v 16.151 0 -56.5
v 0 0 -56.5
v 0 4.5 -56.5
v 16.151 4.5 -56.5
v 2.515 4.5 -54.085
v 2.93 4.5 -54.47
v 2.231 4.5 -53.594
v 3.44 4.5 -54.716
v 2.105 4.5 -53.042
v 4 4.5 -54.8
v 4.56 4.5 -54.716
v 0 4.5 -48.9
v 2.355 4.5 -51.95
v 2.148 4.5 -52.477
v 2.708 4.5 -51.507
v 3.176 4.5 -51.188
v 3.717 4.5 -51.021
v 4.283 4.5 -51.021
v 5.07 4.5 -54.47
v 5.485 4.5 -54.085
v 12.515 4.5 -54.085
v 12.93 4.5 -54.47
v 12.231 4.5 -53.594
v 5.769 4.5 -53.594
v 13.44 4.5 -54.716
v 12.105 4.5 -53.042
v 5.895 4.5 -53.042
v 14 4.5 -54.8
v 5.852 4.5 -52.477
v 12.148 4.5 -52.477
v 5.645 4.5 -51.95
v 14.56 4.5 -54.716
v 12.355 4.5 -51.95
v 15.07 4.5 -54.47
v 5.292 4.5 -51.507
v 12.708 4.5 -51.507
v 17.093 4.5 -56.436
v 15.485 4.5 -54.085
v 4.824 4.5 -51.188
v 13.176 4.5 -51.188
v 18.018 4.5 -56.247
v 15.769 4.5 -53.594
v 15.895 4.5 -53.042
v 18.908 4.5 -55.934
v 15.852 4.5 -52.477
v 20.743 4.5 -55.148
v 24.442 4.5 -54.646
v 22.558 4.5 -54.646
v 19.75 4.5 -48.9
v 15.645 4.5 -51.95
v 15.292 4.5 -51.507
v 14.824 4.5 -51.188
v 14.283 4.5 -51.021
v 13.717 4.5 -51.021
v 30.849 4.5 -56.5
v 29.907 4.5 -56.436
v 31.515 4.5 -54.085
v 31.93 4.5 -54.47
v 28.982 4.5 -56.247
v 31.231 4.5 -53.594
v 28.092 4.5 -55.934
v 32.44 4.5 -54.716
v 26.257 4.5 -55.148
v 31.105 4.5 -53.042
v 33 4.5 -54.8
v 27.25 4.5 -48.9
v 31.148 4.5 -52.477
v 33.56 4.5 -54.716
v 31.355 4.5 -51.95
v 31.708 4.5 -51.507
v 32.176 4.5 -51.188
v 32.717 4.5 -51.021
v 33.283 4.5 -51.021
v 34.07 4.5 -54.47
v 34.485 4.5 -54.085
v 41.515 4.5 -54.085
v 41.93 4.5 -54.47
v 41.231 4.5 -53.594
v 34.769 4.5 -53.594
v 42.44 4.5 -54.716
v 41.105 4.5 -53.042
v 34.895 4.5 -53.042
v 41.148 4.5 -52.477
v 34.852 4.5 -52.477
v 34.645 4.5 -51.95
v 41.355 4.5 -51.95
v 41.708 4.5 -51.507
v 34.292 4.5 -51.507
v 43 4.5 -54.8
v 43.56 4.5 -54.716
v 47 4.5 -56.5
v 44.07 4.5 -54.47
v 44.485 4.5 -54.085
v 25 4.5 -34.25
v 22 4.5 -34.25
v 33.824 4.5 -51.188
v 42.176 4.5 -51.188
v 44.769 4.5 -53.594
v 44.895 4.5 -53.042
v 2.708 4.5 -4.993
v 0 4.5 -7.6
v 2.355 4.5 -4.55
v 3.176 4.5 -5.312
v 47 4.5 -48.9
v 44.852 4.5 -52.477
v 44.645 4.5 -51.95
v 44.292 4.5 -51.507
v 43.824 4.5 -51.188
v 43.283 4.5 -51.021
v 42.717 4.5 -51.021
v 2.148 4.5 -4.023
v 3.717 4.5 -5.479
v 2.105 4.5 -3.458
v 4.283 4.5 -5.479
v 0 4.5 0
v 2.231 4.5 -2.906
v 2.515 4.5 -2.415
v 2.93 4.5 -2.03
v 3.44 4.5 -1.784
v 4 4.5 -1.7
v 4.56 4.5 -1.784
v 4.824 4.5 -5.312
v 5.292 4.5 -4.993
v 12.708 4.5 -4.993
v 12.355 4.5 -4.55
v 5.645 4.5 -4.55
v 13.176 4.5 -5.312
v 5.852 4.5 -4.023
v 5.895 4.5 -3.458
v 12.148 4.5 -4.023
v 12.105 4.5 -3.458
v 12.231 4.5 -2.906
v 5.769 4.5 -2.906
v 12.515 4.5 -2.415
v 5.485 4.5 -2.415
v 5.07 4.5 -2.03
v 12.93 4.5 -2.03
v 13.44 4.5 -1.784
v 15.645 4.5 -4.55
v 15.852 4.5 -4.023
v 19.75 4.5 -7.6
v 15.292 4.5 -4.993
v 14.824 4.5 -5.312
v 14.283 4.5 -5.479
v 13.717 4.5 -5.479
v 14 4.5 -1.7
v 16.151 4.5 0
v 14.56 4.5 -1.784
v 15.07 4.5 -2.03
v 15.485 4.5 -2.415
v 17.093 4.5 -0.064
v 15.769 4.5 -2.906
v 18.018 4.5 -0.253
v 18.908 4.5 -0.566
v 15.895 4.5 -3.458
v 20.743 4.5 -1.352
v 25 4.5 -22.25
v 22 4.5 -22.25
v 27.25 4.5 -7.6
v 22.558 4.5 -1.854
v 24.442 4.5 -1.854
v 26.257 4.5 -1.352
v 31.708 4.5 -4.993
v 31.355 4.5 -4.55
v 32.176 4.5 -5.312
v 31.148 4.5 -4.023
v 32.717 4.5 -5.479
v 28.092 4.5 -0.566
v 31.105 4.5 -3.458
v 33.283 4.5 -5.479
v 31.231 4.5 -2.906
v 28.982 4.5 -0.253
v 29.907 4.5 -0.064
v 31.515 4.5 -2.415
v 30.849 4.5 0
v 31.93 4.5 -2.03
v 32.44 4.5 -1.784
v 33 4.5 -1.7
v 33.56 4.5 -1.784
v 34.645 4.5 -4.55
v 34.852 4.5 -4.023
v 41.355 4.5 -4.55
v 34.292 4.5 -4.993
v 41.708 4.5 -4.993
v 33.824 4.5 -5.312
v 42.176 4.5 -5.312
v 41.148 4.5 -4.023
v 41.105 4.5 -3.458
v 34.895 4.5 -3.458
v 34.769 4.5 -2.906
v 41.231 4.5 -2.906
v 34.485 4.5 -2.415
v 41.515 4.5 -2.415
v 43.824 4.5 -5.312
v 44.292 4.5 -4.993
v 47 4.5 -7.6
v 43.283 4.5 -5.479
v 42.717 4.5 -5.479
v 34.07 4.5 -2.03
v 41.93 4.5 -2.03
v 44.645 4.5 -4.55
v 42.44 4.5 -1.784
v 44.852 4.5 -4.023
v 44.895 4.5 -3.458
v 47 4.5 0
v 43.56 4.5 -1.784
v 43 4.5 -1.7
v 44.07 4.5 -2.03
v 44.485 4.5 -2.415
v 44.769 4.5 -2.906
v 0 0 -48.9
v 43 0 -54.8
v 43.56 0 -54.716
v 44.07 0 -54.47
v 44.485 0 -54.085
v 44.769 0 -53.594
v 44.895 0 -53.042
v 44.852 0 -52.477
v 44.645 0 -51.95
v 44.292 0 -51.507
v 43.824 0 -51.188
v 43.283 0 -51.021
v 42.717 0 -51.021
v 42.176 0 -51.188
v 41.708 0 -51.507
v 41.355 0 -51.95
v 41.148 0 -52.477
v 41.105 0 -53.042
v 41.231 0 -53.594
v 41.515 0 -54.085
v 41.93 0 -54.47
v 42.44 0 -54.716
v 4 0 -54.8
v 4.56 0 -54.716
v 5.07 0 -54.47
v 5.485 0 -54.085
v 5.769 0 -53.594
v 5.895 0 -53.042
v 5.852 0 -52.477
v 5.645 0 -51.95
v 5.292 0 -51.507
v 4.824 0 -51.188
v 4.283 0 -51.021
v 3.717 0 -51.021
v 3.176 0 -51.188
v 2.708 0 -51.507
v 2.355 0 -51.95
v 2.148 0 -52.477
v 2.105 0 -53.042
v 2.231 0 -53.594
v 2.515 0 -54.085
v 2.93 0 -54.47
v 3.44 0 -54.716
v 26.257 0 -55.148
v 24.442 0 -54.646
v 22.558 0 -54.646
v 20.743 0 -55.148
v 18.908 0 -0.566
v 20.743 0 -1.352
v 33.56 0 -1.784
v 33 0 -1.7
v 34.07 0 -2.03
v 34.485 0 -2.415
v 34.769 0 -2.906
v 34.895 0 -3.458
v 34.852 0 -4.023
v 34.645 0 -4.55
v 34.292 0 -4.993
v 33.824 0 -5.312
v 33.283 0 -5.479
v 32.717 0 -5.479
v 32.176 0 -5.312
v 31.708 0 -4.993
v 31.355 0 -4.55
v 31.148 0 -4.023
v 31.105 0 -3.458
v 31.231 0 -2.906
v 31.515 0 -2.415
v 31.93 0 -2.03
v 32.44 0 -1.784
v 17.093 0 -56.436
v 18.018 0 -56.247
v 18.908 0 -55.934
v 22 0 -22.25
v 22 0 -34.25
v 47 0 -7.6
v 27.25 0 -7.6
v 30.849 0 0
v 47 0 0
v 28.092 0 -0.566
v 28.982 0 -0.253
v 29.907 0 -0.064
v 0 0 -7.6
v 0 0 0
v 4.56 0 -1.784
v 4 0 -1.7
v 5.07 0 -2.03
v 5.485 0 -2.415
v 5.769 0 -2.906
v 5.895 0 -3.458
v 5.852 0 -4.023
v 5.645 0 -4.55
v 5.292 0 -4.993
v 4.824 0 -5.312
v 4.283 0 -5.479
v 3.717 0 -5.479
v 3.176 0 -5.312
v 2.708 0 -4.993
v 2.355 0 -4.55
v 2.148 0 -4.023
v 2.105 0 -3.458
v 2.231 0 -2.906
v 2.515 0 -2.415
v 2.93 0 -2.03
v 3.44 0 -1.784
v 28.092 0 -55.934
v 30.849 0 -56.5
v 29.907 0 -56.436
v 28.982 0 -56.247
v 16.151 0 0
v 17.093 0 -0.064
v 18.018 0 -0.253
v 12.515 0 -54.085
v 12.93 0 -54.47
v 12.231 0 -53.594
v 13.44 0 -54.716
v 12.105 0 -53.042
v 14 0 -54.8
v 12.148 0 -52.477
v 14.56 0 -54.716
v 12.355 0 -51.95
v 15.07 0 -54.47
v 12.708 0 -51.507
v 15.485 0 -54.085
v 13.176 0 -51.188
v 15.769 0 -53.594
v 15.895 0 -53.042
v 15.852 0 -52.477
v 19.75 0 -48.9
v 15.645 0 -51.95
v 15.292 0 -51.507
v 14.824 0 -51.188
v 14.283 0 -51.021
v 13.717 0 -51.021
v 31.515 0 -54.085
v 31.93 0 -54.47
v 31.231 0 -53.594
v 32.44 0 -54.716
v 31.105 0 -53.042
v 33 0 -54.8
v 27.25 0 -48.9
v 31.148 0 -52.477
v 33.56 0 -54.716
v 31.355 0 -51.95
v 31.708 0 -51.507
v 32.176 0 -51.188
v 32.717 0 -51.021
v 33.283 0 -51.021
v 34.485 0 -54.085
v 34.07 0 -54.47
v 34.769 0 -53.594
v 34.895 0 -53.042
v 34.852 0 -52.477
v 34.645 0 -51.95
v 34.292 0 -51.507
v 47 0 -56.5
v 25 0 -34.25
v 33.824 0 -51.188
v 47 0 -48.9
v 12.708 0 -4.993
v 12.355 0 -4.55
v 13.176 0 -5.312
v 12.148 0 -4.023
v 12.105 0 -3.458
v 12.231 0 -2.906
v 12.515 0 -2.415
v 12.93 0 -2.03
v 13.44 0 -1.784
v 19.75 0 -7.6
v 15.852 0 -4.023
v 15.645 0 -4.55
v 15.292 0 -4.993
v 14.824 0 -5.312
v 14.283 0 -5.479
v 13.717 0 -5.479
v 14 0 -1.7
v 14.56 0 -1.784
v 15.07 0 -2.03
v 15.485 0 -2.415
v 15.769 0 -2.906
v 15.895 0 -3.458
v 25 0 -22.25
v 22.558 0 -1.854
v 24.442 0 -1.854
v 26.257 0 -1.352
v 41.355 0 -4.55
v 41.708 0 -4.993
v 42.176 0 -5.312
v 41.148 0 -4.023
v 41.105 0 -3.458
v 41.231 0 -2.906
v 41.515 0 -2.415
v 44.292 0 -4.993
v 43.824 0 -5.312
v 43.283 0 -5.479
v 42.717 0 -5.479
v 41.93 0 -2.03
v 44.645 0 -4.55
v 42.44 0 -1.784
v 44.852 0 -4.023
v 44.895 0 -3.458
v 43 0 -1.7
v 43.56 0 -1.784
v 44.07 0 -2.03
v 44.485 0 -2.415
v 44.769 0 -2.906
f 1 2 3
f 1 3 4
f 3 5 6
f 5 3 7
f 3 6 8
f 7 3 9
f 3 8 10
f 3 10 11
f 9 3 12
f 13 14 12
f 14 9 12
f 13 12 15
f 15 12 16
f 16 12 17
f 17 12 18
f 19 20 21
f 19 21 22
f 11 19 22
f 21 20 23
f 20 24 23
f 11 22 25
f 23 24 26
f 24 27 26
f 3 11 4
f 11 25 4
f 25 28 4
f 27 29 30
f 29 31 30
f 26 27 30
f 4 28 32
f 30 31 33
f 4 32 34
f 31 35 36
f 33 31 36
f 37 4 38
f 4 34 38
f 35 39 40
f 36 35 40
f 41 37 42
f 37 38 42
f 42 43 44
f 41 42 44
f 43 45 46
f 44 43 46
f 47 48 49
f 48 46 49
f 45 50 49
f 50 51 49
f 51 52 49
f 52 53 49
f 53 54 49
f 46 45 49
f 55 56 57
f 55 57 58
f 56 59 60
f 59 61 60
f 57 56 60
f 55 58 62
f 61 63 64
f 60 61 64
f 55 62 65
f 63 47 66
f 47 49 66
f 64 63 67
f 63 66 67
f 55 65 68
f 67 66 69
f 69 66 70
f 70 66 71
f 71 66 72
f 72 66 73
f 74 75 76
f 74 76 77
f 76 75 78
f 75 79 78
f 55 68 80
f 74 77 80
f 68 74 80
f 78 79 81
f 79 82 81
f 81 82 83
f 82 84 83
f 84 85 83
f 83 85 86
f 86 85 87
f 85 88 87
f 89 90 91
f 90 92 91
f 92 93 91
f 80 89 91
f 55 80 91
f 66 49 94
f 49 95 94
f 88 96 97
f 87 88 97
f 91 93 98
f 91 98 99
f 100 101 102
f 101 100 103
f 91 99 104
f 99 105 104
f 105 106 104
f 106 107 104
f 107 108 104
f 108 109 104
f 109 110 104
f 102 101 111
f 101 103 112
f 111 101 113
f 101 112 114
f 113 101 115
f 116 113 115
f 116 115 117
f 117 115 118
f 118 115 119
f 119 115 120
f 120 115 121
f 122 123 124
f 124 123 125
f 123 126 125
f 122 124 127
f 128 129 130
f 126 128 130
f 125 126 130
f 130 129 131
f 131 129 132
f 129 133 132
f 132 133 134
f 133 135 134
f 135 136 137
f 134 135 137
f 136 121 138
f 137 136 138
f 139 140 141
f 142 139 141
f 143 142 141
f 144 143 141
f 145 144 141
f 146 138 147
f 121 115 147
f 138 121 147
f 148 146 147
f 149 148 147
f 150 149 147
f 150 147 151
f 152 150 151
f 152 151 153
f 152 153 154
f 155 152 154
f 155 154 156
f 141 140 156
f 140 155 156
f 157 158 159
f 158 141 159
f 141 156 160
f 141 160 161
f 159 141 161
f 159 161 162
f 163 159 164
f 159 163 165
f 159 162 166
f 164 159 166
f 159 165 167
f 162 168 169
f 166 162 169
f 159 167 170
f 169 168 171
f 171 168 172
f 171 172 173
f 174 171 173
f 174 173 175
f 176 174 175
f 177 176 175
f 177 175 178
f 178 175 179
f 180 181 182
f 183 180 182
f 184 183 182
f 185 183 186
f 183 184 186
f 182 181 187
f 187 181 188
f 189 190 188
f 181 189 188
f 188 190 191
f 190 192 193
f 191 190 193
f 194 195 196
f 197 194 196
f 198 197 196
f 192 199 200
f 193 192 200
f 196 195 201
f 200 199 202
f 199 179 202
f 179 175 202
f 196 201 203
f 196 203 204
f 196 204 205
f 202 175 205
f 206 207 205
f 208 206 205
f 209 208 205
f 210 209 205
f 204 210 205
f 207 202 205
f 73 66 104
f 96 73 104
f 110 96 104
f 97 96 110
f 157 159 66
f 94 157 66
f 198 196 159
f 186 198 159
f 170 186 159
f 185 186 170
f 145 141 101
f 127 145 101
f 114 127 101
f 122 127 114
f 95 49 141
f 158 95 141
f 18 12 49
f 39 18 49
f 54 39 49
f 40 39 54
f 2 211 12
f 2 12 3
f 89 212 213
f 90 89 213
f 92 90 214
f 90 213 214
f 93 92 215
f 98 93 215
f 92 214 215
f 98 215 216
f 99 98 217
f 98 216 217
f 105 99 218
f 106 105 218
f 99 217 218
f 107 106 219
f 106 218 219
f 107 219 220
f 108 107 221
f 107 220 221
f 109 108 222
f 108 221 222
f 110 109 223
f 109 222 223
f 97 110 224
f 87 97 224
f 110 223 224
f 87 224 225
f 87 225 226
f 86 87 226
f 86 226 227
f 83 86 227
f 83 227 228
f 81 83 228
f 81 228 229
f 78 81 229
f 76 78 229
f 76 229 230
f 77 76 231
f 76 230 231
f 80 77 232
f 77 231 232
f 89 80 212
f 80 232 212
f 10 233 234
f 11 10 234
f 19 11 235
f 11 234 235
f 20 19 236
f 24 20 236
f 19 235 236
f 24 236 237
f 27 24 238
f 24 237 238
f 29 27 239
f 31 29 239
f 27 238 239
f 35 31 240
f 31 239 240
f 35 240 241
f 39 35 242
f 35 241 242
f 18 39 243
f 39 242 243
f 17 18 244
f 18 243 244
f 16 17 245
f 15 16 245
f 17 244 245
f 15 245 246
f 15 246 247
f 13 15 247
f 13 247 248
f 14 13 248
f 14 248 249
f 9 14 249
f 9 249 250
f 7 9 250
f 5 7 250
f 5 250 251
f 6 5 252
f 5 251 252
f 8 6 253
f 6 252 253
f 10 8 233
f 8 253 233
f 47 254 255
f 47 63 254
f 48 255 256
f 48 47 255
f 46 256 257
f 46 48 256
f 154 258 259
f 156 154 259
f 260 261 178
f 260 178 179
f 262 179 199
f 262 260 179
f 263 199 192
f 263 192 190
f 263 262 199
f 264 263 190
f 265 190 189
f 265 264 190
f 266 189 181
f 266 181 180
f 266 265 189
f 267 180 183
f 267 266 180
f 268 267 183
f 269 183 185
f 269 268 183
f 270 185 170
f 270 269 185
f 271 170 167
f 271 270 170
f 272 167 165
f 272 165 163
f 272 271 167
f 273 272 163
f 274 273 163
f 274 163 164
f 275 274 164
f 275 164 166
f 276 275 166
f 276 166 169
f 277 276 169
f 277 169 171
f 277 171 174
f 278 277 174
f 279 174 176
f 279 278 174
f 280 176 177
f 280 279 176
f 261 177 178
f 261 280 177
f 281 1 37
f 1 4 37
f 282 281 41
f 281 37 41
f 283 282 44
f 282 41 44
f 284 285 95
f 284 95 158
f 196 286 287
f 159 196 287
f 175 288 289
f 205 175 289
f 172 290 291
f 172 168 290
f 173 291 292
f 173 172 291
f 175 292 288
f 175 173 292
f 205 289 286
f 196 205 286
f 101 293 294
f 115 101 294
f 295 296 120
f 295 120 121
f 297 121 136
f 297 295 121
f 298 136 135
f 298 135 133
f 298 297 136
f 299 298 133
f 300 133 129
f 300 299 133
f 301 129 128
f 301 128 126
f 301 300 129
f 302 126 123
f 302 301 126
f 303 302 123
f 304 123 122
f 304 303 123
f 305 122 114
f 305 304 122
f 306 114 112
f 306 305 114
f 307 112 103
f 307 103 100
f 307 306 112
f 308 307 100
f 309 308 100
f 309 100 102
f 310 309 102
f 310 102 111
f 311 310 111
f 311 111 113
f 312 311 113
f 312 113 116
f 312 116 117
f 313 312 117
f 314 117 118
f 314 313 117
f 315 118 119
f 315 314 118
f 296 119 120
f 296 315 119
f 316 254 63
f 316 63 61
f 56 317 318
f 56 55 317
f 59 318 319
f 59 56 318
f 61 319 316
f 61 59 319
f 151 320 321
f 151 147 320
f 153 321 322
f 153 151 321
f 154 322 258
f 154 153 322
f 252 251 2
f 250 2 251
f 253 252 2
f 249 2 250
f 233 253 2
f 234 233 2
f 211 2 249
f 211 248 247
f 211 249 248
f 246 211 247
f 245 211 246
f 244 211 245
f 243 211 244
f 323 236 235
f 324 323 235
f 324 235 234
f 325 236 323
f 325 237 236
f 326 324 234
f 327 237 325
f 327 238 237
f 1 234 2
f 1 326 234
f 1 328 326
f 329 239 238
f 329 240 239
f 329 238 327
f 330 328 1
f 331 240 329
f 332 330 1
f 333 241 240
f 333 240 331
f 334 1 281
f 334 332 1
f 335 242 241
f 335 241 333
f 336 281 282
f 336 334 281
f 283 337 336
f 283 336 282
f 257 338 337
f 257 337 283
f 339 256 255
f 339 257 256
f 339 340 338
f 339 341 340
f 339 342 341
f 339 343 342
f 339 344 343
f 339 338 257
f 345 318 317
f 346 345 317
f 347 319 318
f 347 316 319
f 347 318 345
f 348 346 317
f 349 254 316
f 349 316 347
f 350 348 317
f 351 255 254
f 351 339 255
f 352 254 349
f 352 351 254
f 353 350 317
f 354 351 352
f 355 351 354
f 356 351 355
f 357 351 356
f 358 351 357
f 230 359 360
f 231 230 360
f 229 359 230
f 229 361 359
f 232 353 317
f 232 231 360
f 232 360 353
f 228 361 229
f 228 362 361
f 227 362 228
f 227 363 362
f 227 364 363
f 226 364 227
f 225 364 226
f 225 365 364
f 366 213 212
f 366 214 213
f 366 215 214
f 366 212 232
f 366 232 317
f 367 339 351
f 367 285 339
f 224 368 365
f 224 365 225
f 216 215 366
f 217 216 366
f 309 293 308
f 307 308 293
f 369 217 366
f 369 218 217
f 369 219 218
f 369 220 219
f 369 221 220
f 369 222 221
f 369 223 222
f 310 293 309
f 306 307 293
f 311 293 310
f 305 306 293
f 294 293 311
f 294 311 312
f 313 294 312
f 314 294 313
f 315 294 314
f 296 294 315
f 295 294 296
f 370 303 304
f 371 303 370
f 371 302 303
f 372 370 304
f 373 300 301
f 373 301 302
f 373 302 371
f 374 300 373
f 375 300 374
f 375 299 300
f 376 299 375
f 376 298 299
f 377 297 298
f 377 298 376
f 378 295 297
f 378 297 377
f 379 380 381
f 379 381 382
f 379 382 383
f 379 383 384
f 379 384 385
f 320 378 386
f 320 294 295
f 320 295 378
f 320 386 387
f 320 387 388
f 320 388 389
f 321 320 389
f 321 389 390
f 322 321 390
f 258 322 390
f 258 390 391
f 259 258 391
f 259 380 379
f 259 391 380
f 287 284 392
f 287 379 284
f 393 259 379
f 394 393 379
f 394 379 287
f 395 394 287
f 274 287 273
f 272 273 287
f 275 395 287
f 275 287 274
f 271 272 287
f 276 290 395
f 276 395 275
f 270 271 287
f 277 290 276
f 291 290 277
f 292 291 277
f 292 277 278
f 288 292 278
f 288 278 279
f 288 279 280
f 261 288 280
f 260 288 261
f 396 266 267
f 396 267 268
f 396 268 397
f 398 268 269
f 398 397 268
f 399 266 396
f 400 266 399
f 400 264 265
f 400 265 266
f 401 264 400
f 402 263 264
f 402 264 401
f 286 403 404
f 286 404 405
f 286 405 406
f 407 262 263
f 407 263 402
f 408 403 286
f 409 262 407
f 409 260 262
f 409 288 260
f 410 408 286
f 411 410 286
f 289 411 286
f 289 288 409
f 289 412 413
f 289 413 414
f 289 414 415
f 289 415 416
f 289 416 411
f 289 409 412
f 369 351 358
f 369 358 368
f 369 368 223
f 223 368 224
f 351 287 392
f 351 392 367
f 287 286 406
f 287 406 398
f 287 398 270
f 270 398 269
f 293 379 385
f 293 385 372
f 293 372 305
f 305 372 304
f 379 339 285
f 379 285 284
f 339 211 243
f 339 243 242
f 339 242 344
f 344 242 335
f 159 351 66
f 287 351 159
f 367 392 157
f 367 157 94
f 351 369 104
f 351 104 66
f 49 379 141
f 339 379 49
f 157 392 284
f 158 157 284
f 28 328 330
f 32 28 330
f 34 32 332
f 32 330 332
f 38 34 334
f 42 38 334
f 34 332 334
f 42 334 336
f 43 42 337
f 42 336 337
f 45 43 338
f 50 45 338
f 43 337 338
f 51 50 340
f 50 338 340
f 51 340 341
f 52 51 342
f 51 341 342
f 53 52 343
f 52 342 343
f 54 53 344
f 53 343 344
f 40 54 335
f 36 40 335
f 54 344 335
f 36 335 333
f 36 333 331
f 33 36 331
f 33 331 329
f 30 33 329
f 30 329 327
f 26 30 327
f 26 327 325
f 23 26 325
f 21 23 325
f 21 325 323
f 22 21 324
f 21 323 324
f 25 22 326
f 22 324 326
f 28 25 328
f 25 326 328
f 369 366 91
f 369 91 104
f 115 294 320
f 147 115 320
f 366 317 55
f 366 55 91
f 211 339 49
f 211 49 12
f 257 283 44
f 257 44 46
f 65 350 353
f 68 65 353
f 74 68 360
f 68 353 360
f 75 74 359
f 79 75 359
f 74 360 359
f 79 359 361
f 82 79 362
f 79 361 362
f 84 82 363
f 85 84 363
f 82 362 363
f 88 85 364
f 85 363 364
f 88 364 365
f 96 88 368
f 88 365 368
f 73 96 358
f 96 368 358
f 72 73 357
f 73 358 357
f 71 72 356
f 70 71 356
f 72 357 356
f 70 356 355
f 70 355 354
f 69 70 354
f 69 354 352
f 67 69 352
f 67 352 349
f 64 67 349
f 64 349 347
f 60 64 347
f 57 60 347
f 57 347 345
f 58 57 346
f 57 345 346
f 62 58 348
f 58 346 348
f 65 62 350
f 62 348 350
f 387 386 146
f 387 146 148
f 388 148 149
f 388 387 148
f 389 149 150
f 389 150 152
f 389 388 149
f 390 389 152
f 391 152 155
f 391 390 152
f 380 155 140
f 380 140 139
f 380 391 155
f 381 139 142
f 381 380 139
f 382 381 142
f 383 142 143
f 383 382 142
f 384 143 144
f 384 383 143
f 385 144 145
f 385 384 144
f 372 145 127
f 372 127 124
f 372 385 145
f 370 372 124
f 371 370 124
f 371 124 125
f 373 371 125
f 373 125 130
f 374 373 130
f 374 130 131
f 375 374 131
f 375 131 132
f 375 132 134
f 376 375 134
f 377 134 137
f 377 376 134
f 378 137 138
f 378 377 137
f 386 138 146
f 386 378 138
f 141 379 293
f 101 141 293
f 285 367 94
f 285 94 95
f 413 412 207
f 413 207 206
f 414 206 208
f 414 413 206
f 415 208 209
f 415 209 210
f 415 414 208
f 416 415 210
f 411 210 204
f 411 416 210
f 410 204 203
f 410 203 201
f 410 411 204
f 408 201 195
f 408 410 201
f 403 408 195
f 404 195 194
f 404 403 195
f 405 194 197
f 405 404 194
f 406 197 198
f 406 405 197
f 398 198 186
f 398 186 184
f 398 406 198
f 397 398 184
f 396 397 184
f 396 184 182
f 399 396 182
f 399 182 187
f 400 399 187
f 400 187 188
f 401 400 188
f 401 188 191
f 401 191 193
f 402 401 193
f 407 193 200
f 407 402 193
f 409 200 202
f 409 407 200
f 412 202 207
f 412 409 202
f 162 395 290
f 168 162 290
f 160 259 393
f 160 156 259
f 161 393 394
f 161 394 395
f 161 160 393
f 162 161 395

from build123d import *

# Parameters (mm, degrees)
SKETCH1_R           = 1.9
BOSS_EXTRUDE1_DEPTH = 4.5
FILLET1_R           = 7


with BuildPart() as part:
    # Sketch1 → Boss-Extrude1 (new body)
    with BuildSketch(Plane(origin=(0, 0, 0), x_dir=(1, 0, 0), z_dir=(0, 1, 0))):
        Polygon((0, 0), (17.587865182, 0), (23.5, 2.533671894), (29.412134818, 0), (47, 0), (47, 7.6), (27.25, 7.6), (27.25, 28.25), (25, 28.25), (25, 22.25), (22, 22.25), (22, 28.25), (19.75, 28.25), (19.75, 7.6), (0, 7.6), align=None)
        with Locations(Location((4, 3.6, 0), (0, 0, 270))):
            Circle(SKETCH1_R, mode=Mode.SUBTRACT)
        with Locations(Location((14, 3.6, 0), (0, 0, 270))):
            Circle(SKETCH1_R, mode=Mode.SUBTRACT)
        with Locations(Location((33, 3.6, 0), (0, 0, 270))):
            Circle(SKETCH1_R, mode=Mode.SUBTRACT)
        with Locations(Location((43, 3.6, 0), (0, 0, 270))):
            Circle(SKETCH1_R, mode=Mode.SUBTRACT)
    boss_extrude1 = extrude(amount=BOSS_EXTRUDE1_DEPTH)

    # Mirror1: Boss-Extrude1 across plane
    add(boss_extrude1.mirror(Plane(origin=(19.75, 4.5, -28.25), x_dir=(1, 0, 0), z_dir=(0, 0, 1))))

    # Fillet1
    fillet1_edges = [part.edges().sort_by_distance(p)[0] for p in [
        (29.412134818, 2.25, 0),
        (23.5, 2.25, -2.533671894),
        (17.587865182, 2.25, 0),
        (29.412134818, 2.25, -56.5),
        (23.5, 2.25, -53.966328106),
        (17.587865182, 2.25, -56.5),
    ]]
    fillet(fillet1_edges, radius=FILLET1_R)


solid = part.part
